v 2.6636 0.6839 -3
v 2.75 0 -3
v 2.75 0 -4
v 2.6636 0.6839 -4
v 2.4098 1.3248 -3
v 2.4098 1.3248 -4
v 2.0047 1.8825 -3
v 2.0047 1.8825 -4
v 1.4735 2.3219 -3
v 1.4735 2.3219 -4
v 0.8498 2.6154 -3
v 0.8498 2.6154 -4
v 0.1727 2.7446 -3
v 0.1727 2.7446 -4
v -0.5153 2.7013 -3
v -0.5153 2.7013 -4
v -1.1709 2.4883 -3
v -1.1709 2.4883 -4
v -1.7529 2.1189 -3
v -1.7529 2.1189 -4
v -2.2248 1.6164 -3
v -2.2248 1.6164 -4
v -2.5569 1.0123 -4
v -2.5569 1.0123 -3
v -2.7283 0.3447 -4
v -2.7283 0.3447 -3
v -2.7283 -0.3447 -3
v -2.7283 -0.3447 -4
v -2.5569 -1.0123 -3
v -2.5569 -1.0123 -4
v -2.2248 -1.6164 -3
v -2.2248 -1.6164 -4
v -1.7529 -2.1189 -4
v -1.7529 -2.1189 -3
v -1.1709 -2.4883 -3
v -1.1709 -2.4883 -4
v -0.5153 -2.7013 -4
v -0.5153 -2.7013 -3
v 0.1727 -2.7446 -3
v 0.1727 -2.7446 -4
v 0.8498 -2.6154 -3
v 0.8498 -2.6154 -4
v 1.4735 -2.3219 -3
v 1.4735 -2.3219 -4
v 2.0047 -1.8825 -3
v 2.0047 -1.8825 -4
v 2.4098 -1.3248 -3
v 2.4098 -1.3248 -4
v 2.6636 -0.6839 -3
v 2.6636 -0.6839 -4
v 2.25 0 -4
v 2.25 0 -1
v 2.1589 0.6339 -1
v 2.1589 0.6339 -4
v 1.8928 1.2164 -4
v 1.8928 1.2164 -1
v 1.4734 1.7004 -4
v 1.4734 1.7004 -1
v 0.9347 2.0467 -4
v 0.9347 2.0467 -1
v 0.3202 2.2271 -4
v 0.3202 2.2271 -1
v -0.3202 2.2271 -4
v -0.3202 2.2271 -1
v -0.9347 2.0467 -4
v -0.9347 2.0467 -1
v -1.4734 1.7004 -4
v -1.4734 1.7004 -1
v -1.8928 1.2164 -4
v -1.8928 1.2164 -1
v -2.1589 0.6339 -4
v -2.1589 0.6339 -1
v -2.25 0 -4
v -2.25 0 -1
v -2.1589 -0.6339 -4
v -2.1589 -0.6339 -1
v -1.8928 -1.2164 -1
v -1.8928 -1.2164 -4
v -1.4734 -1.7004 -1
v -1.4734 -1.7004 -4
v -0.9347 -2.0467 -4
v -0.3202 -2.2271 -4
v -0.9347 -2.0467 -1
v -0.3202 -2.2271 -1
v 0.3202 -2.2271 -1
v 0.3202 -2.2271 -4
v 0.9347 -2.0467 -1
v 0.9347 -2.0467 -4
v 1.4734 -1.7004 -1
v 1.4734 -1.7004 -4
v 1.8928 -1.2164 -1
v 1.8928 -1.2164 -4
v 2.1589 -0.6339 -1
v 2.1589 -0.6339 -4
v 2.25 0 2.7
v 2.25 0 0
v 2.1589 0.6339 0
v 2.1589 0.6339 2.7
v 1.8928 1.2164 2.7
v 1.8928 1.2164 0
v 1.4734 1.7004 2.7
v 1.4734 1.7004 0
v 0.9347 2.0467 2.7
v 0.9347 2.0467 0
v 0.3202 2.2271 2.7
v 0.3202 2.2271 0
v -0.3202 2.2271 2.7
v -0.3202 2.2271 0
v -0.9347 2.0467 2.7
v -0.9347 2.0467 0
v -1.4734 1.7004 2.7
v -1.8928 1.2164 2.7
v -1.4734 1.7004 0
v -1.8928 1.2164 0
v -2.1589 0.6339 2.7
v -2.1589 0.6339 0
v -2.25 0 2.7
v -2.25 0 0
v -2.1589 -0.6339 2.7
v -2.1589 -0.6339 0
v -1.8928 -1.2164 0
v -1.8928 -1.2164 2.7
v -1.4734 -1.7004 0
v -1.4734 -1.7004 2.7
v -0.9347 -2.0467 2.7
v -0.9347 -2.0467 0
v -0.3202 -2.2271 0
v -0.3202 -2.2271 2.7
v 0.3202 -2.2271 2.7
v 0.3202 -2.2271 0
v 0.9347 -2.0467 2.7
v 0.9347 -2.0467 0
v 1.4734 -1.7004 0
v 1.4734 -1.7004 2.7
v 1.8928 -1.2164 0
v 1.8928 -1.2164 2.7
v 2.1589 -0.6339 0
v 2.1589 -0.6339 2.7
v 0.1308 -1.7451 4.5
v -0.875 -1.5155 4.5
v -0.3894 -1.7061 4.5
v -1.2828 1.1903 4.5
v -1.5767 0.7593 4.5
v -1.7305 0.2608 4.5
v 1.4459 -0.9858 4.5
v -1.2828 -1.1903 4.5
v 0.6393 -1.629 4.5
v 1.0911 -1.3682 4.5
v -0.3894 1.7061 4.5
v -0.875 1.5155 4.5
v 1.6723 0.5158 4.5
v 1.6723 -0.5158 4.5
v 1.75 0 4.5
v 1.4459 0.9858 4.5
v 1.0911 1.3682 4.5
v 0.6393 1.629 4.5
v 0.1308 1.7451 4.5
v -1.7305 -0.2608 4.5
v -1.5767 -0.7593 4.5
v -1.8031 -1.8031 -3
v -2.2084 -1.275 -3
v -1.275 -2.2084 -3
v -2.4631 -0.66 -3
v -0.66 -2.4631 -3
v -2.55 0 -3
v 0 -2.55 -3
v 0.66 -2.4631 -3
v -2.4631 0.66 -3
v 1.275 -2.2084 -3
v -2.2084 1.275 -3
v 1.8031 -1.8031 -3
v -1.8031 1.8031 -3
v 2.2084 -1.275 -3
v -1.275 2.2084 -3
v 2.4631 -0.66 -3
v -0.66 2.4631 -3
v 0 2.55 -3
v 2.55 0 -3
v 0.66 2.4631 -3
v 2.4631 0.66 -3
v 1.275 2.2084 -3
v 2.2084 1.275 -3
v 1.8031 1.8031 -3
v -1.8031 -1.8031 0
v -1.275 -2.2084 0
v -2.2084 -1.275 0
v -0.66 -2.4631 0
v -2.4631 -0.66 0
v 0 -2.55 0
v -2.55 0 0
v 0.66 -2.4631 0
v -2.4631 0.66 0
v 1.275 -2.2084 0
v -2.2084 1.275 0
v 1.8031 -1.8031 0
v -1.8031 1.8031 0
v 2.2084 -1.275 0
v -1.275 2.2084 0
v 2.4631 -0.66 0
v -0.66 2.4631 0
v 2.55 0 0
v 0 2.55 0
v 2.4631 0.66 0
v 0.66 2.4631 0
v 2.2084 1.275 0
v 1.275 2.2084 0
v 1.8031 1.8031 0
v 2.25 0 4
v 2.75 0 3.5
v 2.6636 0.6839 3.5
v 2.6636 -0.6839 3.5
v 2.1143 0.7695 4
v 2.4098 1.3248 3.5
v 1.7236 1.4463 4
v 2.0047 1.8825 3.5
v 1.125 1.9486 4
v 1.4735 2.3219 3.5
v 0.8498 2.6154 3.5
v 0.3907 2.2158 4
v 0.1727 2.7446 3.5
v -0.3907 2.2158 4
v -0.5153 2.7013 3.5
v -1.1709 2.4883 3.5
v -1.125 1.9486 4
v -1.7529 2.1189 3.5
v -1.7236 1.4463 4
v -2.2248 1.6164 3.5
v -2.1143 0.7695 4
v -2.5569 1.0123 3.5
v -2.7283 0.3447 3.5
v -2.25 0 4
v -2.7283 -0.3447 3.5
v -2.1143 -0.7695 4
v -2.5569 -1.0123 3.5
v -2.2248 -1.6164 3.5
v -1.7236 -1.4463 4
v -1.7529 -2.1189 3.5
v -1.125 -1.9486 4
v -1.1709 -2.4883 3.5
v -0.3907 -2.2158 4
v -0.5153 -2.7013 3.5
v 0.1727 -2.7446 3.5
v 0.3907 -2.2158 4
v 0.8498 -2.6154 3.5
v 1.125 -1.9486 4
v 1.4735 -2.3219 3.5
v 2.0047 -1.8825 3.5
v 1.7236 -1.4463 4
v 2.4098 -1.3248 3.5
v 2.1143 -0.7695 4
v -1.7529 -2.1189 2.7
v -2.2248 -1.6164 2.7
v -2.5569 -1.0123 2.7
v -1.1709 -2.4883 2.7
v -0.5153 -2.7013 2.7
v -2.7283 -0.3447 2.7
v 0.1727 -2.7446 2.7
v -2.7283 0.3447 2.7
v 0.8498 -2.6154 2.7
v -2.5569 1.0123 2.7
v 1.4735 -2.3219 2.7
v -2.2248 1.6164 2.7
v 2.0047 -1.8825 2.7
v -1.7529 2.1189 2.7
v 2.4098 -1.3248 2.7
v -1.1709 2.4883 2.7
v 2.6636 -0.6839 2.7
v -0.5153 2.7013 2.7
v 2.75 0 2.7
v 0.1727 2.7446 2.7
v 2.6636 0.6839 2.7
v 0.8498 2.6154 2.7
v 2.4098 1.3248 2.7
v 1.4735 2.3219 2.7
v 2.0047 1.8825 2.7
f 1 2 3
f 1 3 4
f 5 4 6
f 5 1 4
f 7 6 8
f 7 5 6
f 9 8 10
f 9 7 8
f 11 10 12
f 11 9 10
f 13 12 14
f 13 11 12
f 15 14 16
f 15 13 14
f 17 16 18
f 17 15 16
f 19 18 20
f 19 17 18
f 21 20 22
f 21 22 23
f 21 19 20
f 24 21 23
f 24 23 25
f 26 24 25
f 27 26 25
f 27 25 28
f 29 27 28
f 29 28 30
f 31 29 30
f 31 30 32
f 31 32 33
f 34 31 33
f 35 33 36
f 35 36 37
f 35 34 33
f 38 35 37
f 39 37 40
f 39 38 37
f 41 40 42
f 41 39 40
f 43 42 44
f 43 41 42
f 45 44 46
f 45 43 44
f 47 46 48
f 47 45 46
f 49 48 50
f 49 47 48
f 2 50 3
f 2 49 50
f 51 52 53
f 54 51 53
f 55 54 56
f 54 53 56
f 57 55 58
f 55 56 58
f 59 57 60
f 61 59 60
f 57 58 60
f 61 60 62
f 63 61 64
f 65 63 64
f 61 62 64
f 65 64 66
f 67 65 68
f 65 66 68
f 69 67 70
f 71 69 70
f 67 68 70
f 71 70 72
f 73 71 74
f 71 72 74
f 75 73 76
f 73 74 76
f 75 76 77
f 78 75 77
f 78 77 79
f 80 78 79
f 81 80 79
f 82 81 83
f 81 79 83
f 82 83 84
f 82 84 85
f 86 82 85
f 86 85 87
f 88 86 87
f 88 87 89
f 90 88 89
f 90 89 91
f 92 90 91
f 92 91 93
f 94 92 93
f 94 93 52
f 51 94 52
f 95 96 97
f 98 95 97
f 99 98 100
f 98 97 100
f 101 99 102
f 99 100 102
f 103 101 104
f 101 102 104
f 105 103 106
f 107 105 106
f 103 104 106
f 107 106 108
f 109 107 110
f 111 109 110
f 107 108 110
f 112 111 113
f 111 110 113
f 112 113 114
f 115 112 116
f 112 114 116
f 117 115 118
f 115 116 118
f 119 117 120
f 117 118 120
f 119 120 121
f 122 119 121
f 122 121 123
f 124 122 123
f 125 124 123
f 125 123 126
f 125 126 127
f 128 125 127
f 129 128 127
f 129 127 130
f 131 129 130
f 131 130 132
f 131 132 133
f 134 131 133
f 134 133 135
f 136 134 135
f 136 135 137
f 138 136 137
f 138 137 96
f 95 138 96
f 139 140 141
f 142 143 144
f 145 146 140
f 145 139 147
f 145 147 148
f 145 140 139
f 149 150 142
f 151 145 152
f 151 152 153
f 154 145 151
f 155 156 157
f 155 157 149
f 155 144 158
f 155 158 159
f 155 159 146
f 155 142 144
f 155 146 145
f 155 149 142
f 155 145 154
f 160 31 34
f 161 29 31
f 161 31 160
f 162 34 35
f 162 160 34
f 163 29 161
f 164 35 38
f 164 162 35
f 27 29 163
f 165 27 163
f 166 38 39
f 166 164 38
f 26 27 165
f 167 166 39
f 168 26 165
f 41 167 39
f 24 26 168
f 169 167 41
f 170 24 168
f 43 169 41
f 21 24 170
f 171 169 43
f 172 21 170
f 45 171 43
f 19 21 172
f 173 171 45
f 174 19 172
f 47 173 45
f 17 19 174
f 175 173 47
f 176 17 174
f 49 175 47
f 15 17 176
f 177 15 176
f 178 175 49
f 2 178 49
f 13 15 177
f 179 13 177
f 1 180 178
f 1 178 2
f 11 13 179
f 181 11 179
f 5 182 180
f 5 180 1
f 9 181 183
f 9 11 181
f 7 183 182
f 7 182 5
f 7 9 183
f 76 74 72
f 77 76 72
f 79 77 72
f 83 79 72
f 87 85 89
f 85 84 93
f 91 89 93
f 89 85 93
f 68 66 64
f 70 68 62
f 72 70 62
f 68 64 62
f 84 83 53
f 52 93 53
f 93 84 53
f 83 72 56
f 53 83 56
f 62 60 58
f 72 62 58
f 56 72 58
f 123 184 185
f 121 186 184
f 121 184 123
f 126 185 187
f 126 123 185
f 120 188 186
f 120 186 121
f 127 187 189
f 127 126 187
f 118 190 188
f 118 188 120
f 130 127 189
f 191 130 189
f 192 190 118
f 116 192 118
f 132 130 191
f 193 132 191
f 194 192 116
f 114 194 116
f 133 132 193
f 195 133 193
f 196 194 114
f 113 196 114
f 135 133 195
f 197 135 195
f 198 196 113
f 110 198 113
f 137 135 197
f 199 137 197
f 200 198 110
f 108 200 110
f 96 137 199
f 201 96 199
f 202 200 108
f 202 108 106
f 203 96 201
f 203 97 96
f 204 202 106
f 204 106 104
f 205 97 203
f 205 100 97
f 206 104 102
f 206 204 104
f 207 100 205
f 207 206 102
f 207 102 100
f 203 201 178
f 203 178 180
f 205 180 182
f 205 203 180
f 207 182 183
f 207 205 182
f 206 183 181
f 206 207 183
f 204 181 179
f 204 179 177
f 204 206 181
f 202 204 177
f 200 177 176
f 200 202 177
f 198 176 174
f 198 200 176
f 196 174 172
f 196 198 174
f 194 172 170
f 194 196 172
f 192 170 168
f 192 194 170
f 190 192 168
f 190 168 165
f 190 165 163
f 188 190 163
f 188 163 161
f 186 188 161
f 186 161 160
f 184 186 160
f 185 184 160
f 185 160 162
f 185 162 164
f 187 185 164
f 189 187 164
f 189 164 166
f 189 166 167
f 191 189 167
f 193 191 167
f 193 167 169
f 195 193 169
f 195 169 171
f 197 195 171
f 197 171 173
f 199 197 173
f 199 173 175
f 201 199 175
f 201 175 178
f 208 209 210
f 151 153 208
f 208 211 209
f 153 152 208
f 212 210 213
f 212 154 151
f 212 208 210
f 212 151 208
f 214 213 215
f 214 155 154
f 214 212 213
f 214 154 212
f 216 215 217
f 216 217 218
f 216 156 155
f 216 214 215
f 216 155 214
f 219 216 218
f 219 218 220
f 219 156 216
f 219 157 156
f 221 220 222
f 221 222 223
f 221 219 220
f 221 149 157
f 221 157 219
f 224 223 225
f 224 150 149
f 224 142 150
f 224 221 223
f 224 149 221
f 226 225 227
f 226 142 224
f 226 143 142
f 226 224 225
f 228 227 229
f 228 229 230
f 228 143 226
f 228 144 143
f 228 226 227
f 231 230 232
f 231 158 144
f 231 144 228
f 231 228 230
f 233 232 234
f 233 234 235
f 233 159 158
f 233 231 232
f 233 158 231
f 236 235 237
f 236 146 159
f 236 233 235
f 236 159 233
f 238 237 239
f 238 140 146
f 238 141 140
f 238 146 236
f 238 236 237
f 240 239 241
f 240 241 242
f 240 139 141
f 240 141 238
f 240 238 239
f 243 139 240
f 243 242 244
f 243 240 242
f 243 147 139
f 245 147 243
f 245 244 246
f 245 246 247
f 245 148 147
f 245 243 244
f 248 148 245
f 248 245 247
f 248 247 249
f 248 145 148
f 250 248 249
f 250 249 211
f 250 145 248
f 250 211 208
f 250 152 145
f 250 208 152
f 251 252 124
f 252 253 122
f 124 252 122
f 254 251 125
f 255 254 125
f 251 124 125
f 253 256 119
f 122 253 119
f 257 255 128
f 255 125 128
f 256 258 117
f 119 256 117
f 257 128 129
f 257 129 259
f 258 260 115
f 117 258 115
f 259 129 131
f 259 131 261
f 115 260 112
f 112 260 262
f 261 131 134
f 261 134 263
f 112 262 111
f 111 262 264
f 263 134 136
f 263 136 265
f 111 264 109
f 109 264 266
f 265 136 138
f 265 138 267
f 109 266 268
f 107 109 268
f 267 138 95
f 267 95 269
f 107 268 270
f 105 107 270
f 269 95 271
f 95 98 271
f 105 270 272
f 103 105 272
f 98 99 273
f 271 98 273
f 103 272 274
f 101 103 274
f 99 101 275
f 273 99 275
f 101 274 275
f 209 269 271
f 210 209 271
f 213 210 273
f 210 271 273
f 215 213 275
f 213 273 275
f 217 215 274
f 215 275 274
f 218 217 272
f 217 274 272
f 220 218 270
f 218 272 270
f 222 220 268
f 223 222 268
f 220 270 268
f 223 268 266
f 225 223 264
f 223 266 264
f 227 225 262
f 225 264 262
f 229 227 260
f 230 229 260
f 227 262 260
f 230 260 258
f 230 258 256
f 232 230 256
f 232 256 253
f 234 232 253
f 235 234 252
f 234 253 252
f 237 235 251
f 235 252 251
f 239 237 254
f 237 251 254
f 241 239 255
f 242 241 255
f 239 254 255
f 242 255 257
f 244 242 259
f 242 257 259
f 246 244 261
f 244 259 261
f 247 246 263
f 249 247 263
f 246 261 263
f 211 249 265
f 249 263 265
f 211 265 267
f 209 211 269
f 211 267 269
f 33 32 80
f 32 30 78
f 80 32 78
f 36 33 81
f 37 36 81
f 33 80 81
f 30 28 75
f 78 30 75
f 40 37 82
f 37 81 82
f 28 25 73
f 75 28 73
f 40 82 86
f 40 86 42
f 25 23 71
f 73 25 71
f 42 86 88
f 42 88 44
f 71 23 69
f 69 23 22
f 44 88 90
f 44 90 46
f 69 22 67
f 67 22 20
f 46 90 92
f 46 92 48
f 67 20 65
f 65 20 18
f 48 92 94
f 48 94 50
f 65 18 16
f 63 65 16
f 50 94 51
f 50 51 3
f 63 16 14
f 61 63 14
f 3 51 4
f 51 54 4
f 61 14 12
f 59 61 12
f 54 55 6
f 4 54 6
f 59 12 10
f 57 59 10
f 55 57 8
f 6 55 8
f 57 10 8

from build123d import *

# Parameters (mm, degrees)
F0_R          = 2.55
F0_R_2        = 2.25
F1_DEPTH      = 4
F2_START      = -3
F0_R_3        = 2.75
F2_DEPTH      = 1
F3_DEPTH      = 4.5
F3_DEPTH_BACK = 1
F4_START      = 2.7
F4_DEPTH      = 1.8
F5_SIZE       = 1


with BuildPart() as f1:
    # F0 (on Top) → F1 (new body)
    with BuildSketch(Plane.XY):
        Circle(F0_R)
        Circle(F0_R_2, mode=Mode.SUBTRACT)
    extrude(amount=-F1_DEPTH)

    # F0 (on Top) → F2 (join)
    with BuildSketch(Plane.XY.offset(F2_START)):
        Circle(F0_R_3)
        Circle(F0_R, mode=Mode.SUBTRACT)
    extrude(amount=-F2_DEPTH)

    # F0 (on Top) → F3 (join, two sides)
    with BuildSketch(Plane.XY) as f3_sk:
        Circle(F0_R_2)
    extrude(amount=F3_DEPTH)
    extrude(f3_sk.sketch, amount=-F3_DEPTH_BACK)

    # F0 (on Top) → F4 (join)
    with BuildSketch(Plane.XY.offset(F4_START)):
        Circle(F0_R_3)
        Circle(F0_R, mode=Mode.SUBTRACT)
        Circle(F0_R)
        Circle(F0_R_2, mode=Mode.SUBTRACT)
    extrude(amount=F4_DEPTH)

    # F5
    f5_edges = [f1.edges().sort_by_distance(p)[0] for p in [
        (-2.75, 0, 4.5),
    ]]
    chamfer(f5_edges, length=F5_SIZE)


solid = f1.part
